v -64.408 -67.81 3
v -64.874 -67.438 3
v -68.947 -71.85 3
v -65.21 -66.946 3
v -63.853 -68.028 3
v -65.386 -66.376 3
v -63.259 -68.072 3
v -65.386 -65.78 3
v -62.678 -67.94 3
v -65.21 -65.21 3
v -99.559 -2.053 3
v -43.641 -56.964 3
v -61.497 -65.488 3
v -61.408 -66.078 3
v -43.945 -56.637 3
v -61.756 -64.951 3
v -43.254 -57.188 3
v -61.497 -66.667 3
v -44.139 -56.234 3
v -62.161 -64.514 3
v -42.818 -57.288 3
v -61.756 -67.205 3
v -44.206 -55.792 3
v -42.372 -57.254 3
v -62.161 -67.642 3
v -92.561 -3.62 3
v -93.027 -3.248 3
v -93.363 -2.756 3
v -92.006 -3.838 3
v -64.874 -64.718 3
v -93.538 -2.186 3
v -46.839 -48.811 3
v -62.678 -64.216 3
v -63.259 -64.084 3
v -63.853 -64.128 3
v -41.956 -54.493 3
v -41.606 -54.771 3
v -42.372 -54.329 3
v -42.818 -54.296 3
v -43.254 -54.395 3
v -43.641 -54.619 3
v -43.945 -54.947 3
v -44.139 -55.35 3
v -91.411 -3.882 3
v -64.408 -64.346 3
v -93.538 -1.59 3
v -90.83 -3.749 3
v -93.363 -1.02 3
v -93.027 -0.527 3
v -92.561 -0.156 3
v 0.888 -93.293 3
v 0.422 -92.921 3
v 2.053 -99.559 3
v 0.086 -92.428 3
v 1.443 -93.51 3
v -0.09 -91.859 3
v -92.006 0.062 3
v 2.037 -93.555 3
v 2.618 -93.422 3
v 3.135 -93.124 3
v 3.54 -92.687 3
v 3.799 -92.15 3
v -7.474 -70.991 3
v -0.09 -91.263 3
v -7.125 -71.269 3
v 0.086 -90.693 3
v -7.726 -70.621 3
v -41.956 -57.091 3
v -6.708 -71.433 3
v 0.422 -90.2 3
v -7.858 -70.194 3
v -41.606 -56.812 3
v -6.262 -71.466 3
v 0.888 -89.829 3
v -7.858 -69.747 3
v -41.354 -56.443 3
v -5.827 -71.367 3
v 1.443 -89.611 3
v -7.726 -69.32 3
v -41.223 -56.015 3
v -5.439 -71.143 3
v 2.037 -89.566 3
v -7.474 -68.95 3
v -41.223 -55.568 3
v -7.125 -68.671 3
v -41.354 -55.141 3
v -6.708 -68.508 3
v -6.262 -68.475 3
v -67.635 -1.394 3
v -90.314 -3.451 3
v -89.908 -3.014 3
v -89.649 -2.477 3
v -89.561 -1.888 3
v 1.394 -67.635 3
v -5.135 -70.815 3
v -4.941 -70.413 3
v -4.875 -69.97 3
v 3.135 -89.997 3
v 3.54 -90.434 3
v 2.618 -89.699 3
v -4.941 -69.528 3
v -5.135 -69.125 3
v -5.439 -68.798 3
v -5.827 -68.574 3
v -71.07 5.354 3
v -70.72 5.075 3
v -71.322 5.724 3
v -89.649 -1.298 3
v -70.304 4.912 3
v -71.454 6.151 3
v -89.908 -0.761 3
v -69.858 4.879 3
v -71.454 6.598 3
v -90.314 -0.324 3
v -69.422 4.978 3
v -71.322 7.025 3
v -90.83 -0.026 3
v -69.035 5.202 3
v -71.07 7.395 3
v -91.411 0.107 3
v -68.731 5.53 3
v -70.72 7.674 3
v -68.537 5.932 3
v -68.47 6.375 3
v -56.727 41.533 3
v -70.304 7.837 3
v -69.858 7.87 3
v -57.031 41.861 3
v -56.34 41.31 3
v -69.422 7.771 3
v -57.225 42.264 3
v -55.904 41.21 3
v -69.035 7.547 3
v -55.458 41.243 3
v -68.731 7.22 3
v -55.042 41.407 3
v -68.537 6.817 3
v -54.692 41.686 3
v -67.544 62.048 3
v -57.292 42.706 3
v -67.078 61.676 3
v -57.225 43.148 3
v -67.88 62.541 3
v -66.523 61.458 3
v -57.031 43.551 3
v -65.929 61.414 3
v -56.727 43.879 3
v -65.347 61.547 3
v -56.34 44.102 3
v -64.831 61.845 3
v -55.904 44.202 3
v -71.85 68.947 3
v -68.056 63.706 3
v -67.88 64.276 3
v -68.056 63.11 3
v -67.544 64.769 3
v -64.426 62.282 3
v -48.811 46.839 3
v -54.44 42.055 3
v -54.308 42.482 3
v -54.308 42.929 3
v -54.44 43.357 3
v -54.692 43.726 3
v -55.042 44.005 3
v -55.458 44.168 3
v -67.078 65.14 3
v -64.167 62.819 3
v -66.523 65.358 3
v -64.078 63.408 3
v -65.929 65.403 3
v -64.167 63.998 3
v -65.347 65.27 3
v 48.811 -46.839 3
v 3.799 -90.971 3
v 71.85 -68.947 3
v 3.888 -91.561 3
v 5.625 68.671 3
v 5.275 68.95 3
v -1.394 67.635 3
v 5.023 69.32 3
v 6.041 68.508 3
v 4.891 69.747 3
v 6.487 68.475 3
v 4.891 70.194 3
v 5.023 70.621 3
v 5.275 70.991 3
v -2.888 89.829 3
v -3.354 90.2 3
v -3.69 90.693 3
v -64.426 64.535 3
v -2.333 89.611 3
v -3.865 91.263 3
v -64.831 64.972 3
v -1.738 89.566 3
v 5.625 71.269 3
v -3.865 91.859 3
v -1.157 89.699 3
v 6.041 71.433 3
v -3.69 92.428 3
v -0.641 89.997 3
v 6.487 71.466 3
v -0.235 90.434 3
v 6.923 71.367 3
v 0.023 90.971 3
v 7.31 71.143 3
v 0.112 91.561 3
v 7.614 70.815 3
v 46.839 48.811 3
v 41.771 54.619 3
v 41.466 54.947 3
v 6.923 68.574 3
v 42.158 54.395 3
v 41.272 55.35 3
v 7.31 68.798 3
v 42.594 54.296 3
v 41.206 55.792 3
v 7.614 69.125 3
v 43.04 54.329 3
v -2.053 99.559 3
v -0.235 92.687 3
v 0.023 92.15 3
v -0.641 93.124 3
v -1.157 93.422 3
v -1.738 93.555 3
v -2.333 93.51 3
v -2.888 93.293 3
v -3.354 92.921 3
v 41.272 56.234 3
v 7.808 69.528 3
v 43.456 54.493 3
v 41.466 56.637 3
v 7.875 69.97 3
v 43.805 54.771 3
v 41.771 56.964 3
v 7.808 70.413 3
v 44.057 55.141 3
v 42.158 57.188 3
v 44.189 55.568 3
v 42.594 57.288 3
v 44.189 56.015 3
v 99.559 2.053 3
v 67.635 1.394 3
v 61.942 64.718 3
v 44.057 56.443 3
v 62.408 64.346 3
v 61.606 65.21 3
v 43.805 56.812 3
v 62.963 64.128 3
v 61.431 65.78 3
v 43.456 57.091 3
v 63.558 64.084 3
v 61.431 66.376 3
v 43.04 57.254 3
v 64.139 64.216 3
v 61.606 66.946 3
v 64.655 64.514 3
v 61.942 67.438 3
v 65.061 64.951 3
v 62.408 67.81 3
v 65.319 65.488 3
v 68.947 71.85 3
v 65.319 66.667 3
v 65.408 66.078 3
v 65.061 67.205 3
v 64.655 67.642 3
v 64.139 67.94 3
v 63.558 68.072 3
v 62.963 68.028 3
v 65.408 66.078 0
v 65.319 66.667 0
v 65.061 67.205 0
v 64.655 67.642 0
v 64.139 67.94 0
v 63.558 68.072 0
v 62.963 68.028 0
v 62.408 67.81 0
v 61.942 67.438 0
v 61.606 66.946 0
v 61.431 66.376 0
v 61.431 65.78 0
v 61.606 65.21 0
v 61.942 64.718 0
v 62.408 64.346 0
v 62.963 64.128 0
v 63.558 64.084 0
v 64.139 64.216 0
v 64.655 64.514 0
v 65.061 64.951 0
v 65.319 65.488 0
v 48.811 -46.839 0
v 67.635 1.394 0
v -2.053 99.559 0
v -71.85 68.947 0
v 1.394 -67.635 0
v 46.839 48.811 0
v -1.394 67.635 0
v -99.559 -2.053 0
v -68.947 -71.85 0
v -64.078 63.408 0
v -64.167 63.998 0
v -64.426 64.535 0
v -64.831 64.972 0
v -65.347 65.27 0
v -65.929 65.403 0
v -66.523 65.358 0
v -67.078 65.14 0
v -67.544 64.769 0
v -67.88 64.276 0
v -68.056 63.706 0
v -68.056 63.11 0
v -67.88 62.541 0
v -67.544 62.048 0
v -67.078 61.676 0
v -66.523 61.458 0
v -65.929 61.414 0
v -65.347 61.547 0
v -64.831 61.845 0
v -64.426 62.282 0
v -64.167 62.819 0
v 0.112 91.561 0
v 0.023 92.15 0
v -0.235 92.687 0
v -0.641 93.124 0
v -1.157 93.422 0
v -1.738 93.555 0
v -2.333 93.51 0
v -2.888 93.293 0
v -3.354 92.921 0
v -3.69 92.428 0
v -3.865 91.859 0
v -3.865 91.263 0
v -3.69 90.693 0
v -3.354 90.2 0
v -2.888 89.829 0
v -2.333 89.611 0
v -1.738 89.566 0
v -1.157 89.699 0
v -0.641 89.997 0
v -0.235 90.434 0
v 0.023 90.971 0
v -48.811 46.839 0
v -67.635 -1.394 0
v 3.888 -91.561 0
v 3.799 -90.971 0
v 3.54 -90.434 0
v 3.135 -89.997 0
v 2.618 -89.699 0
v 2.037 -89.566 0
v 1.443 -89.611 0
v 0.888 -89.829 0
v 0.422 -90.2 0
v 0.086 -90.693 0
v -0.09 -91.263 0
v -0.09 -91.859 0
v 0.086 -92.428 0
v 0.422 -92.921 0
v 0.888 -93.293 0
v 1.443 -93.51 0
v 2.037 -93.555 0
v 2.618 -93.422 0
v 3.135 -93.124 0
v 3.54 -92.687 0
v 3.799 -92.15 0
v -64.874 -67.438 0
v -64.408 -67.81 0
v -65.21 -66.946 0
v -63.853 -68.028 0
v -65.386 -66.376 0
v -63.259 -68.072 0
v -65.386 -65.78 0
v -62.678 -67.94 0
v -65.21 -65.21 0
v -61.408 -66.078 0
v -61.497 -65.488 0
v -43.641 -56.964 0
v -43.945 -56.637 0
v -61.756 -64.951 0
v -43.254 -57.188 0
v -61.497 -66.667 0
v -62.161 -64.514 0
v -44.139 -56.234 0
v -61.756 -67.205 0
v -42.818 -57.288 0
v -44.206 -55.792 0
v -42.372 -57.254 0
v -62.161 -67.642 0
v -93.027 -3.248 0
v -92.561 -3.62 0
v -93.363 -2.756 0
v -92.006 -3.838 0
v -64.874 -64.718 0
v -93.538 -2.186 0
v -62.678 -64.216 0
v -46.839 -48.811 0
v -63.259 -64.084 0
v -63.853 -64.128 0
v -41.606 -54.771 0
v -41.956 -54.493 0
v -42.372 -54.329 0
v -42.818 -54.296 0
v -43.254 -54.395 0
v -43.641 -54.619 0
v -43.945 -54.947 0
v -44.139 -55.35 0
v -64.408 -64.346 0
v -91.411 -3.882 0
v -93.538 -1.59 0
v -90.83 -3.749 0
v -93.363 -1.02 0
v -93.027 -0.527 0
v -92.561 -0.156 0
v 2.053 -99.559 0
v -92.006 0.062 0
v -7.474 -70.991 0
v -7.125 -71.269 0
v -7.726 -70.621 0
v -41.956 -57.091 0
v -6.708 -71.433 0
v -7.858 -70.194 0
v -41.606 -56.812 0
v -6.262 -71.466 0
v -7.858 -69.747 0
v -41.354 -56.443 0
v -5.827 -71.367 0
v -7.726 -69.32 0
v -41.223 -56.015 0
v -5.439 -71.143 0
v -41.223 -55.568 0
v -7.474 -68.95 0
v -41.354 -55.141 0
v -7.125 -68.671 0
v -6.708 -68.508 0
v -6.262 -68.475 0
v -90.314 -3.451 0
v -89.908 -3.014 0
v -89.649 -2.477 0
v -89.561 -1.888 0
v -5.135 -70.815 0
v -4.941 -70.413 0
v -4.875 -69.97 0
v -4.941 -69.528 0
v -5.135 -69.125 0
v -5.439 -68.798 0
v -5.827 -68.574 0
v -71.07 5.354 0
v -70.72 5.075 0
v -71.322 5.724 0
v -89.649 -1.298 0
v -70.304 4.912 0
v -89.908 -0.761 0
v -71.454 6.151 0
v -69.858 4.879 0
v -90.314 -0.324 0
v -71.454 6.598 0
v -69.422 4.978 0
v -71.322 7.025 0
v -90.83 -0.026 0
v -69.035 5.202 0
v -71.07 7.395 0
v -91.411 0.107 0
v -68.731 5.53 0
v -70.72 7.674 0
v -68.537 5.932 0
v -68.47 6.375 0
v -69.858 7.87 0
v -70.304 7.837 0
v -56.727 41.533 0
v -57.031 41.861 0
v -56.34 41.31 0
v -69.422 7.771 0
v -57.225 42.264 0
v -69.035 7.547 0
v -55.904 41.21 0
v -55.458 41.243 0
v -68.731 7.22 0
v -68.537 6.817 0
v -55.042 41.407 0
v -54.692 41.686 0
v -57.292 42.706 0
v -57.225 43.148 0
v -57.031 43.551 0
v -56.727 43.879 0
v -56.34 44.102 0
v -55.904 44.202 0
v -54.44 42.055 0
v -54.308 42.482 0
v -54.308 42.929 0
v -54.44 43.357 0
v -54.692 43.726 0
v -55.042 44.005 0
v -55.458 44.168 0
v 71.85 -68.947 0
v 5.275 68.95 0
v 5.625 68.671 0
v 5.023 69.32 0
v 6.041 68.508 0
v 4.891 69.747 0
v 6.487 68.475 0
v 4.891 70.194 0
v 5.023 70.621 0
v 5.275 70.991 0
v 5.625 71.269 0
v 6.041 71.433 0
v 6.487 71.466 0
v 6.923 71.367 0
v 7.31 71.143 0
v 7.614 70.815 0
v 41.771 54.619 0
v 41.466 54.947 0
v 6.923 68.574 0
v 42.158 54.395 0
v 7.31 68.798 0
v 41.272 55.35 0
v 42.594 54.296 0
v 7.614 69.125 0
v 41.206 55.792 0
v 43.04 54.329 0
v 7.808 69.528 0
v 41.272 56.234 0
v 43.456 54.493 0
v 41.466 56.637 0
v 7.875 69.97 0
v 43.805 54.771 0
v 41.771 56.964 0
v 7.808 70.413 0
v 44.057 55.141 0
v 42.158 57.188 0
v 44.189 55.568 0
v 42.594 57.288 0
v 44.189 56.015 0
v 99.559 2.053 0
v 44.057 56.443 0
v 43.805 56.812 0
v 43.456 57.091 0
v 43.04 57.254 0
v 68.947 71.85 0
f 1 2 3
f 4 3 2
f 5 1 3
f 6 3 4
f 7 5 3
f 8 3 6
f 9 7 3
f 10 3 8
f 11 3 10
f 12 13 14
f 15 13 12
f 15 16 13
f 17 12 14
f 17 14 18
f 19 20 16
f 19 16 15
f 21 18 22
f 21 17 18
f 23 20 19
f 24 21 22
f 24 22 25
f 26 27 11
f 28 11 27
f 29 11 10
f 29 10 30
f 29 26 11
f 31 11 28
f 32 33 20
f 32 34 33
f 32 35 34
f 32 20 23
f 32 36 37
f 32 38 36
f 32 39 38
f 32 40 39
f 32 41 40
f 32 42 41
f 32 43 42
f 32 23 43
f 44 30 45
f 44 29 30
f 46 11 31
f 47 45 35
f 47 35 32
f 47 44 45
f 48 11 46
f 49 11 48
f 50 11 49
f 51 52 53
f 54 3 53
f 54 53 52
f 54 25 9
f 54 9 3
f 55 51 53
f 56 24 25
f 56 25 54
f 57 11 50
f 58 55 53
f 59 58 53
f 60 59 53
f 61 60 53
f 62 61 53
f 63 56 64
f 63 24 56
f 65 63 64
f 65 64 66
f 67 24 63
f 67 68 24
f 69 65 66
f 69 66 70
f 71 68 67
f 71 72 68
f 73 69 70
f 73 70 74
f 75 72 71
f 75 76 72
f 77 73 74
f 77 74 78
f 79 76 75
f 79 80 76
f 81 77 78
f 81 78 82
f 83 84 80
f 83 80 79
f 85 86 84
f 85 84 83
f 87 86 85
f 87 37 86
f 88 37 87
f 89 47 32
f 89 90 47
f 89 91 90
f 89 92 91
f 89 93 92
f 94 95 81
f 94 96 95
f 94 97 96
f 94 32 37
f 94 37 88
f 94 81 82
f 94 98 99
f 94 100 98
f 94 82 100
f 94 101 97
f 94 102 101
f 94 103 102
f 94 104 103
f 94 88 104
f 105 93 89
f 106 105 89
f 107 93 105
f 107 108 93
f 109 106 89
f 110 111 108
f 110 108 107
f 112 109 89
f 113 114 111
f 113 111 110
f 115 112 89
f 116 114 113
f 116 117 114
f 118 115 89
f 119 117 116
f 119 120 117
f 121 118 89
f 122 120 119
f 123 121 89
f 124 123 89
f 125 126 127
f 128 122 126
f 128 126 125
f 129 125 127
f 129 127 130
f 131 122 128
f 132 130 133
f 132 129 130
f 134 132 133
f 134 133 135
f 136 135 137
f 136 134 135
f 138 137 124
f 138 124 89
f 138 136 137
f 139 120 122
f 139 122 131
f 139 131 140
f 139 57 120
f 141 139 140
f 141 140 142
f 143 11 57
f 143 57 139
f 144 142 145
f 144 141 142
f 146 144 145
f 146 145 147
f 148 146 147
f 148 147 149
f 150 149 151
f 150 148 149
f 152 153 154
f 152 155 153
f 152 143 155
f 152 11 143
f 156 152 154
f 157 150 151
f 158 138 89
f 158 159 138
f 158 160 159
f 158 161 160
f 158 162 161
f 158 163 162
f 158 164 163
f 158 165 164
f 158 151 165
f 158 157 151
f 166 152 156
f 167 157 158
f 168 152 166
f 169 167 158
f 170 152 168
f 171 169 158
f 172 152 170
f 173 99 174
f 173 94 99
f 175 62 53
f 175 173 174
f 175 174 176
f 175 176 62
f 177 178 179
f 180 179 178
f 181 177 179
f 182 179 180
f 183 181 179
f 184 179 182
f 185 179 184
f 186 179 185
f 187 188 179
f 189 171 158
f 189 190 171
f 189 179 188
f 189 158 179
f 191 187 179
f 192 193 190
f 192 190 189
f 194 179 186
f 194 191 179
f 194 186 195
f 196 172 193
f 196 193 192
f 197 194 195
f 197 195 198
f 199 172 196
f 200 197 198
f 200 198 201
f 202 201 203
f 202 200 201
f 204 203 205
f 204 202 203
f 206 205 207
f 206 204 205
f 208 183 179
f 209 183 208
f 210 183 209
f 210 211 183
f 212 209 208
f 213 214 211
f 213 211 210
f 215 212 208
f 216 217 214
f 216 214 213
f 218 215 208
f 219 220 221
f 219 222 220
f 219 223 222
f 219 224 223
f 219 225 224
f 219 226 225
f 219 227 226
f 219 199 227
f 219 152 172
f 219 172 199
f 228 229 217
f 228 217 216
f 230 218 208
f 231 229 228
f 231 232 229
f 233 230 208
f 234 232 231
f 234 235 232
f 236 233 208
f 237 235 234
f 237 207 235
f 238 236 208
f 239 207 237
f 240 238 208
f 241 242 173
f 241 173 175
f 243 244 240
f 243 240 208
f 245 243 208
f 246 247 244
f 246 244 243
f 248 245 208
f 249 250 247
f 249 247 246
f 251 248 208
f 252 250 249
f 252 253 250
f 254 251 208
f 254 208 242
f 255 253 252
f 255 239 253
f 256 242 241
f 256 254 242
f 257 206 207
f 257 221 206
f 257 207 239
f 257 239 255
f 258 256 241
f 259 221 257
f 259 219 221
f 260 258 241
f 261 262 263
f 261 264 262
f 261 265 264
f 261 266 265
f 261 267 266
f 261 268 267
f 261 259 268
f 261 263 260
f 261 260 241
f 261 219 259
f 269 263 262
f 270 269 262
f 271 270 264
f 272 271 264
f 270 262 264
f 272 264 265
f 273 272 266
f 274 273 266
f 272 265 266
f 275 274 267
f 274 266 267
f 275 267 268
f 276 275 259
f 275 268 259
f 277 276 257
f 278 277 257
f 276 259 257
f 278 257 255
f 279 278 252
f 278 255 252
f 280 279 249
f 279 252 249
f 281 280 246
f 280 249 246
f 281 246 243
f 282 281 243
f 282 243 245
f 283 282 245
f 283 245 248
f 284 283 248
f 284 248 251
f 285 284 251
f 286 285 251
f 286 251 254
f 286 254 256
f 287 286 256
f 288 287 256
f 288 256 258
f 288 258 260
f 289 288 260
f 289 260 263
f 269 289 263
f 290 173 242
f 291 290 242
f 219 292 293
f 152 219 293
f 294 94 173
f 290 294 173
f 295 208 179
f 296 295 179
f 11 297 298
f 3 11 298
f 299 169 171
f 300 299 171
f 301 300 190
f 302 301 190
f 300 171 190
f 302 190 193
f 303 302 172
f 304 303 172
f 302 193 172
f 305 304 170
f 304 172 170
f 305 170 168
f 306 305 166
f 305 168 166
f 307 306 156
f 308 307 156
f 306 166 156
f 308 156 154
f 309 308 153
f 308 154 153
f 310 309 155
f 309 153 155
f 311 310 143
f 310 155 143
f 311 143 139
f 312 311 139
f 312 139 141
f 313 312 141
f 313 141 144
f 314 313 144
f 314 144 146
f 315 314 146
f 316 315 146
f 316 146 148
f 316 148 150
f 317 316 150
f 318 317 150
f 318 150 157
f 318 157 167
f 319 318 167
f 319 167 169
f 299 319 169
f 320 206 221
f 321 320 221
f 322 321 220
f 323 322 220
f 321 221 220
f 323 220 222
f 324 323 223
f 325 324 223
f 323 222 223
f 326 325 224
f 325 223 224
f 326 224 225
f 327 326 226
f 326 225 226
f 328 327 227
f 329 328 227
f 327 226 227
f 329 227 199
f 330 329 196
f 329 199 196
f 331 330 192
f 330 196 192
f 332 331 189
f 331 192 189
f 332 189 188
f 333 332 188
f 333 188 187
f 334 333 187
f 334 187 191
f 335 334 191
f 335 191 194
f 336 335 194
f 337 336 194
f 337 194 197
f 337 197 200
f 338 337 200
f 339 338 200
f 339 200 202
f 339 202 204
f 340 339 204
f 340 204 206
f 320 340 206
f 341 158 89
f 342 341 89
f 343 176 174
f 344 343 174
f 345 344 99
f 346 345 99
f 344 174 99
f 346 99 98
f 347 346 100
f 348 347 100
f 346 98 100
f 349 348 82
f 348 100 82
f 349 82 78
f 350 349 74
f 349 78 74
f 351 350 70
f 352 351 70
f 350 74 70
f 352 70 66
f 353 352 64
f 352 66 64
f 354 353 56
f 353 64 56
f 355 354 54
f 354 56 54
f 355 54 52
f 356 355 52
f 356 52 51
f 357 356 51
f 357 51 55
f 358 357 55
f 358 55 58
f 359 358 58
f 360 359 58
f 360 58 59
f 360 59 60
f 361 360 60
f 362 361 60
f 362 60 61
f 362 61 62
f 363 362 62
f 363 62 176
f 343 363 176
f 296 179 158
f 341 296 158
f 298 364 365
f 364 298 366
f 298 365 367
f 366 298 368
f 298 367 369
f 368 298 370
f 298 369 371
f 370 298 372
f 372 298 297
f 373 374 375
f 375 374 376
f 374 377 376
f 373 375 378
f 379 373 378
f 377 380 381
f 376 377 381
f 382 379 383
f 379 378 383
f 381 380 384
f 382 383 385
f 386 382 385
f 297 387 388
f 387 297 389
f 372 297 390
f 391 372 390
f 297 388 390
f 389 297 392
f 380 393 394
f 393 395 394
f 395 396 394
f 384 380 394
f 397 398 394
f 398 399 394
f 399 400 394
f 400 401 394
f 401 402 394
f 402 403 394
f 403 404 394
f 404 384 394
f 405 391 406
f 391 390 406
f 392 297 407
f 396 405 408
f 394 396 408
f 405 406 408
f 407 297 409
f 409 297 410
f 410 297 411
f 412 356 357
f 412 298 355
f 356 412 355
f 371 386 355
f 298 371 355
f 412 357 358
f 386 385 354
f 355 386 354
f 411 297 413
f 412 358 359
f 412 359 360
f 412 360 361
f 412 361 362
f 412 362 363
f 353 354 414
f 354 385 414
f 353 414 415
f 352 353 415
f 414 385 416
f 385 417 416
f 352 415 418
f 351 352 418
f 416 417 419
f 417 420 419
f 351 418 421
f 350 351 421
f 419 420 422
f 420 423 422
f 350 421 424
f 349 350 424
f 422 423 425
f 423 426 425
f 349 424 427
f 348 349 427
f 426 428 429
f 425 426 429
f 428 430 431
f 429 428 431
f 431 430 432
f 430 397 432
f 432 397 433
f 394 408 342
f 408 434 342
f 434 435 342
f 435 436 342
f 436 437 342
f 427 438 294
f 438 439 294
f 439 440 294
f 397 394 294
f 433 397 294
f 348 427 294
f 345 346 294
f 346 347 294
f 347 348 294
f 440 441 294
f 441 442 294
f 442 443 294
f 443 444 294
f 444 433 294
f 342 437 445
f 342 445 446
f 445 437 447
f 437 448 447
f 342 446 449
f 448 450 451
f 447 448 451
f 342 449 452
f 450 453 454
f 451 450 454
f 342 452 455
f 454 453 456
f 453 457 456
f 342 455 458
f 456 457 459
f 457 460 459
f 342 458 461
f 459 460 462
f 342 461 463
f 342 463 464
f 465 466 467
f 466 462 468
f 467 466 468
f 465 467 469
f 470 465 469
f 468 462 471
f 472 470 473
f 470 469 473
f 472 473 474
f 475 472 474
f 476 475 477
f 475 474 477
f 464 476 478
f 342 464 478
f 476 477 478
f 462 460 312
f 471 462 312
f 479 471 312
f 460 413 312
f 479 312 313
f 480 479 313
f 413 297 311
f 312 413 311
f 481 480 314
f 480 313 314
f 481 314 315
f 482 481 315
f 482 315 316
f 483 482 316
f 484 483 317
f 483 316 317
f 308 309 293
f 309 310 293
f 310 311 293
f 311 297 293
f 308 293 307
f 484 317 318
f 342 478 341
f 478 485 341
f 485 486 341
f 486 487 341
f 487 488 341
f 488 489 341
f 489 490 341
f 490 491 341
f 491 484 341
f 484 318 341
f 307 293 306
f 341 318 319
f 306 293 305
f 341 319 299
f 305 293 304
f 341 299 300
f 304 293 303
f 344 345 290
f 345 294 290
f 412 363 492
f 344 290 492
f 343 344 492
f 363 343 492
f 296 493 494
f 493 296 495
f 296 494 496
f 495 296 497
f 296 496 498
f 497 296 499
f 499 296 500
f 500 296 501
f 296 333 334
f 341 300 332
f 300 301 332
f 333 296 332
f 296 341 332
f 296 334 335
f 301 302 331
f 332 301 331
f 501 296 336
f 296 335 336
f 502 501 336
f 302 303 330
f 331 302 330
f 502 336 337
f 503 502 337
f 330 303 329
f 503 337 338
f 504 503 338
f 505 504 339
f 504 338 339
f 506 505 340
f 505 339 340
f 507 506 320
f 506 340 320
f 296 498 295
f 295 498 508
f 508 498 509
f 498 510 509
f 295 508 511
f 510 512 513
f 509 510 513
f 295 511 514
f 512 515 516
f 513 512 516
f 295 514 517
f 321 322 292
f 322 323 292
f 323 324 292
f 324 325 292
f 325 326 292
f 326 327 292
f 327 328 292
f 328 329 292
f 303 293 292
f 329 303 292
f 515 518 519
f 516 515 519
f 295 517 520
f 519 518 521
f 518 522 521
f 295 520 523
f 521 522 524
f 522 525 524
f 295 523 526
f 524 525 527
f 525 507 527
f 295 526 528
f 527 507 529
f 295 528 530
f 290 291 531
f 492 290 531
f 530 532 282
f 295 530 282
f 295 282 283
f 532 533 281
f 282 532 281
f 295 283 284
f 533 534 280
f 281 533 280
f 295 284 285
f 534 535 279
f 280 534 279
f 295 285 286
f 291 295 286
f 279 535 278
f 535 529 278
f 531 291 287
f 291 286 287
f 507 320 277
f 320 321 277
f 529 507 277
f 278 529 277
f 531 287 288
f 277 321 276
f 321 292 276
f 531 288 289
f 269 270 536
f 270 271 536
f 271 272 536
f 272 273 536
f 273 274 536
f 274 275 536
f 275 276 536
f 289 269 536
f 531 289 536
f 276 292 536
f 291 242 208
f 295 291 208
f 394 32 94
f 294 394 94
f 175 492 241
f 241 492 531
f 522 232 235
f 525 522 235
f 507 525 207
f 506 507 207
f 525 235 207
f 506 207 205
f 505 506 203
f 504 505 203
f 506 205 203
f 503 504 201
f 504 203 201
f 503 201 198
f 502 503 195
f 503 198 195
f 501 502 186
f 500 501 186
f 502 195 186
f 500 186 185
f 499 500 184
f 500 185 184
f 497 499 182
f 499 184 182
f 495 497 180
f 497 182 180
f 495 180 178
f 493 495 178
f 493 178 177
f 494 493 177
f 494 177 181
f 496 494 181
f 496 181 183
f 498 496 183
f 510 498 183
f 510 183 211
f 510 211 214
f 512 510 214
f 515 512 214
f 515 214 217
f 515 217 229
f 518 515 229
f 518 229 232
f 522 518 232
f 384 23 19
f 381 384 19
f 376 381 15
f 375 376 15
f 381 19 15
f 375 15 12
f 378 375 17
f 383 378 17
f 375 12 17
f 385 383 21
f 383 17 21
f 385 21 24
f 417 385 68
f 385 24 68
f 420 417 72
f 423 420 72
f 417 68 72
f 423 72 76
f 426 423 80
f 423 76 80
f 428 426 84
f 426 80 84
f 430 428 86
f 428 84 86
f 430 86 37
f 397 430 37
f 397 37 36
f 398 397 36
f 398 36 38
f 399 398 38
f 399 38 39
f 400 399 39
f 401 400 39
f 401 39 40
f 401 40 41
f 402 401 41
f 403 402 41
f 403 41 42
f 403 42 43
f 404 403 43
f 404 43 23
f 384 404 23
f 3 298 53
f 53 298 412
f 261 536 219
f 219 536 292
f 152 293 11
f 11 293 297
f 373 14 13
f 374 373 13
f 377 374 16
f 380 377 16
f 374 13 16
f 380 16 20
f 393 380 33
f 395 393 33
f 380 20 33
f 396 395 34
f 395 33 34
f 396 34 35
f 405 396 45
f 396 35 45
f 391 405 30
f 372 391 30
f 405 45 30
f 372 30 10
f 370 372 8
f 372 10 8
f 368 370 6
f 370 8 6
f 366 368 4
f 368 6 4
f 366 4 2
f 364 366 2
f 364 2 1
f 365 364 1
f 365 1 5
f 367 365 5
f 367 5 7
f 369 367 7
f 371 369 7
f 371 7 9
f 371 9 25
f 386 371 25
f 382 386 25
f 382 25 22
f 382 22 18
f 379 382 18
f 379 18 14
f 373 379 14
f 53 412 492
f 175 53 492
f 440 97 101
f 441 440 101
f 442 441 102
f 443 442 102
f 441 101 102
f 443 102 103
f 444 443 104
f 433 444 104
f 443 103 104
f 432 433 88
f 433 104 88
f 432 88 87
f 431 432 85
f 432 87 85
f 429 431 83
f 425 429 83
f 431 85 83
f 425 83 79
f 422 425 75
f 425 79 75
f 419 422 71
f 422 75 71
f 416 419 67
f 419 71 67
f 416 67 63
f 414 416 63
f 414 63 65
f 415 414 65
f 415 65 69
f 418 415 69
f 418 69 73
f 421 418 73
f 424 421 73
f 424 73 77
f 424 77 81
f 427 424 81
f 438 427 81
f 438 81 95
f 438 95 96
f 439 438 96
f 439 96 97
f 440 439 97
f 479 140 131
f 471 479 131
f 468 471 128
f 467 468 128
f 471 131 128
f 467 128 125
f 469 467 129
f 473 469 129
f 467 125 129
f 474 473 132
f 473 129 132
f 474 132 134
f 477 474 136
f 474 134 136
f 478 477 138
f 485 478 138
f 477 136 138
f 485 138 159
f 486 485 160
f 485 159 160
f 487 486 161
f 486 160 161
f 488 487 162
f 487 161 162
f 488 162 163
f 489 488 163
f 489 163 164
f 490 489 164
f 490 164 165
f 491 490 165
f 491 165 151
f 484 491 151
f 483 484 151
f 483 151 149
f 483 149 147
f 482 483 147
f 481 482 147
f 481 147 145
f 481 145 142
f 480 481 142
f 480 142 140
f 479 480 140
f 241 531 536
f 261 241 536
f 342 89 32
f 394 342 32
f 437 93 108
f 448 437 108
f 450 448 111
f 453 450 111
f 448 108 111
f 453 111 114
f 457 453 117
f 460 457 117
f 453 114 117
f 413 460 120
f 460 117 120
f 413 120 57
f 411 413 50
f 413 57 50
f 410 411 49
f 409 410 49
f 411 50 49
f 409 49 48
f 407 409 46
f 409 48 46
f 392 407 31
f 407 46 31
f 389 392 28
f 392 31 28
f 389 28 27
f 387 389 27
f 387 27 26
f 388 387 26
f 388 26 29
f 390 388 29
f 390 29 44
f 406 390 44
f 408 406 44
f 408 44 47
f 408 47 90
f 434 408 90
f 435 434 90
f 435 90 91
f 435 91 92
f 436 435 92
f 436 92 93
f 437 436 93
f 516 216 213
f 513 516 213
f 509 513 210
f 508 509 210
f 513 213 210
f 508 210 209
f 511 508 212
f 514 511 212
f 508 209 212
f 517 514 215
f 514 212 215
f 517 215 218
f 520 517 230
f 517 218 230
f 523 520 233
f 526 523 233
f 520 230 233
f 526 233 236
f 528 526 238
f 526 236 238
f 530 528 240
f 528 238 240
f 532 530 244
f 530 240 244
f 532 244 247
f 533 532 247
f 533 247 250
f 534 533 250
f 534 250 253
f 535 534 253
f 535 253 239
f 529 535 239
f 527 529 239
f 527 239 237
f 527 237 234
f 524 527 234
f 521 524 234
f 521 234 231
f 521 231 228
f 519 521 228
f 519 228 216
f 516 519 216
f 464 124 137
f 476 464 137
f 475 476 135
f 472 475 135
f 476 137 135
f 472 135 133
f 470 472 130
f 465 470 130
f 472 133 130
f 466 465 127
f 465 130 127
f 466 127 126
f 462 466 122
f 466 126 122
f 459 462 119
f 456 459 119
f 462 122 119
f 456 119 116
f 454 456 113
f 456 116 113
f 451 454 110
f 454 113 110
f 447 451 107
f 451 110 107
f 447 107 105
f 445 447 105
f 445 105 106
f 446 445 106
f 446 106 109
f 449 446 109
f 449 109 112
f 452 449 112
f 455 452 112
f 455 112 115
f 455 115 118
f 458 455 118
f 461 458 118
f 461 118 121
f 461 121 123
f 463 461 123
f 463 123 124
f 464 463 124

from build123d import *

# Parameters (mm, degrees)
SALIENTE_EXTRUIR1_DEPTH = 3
CROQUIS2_R              = 1.5
CORTAR_EXTRUIR1_DEPTH   = 141.829538188
CROQUIS3_R              = 2
CORTAR_EXTRUIR2_DEPTH   = 141.829538188


with BuildPart() as part:
    # Croquis1 → Saliente-Extruir1 (new body)
    with BuildSketch(Plane.XY):
        Polygon((-99.558924327, -2.052657564), (-68.947342436, -71.850238602), (2.052657564, -99.558924327), (71.850238602, -68.947342436), (99.558924327, 2.052657564), (68.947342436, 71.850238602), (-2.052657564, 99.558924327), (-71.850238602, 68.947342436), align=None)
    extrude(amount=SALIENTE_EXTRUIR1_DEPTH)

    # Croquis2 → Cortar-Extruir1 (cut, through all)
    with BuildSketch(Plane.XY.offset(3)):
        with Locations((6.374524738, 69.970461156)):
            Circle(CROQUIS2_R)
        with Locations(Location((42.705814706, 55.791696428, 0), (0, 0, 180))):
            Circle(CROQUIS2_R)
        with Locations((-6.374524738, -69.970461156)):
            Circle(CROQUIS2_R)
        with Locations(Location((-42.705814706, -55.791696428, 0), (0, 0, 180))):
            Circle(CROQUIS2_R)
        with Locations((-69.970461156, 6.374524738)):
            Circle(CROQUIS2_R)
        with Locations(Location((-55.791696428, 42.705814706, 0), (0, 0, 180))):
            Circle(CROQUIS2_R)
        Polygon((-67.635138809, -1.394468454), (-46.839227198, -48.811303398), (1.394468454, -67.635138809), (48.811303398, -46.839227198), (67.635138809, 1.394468454), (46.839227198, 48.811303398), (-1.394468454, 67.635138809), (-48.811303398, 46.839227198), align=None)
    extrude(amount=-CORTAR_EXTRUIR1_DEPTH, mode=Mode.SUBTRACT)

    # Croquis3 → Cortar-Extruir2 (cut, through all)
    with BuildSketch(Plane.XY.offset(3)):
        with Locations((-1.887752493, 91.560624112)):
            Circle(CROQUIS3_R)
        with Locations((63.40829561, 66.077980789)):
            Circle(CROQUIS3_R)
        with Locations((1.887752493, -91.560624112)):
            Circle(CROQUIS3_R)
        with Locations((-63.40829561, -66.077980789)):
            Circle(CROQUIS3_R)
        with Locations((-91.560624112, -1.887752493)):
            Circle(CROQUIS3_R)
        with Locations((-66.077980789, 63.40829561)):
            Circle(CROQUIS3_R)
    extrude(amount=-CORTAR_EXTRUIR2_DEPTH, mode=Mode.SUBTRACT)


solid = part.part
